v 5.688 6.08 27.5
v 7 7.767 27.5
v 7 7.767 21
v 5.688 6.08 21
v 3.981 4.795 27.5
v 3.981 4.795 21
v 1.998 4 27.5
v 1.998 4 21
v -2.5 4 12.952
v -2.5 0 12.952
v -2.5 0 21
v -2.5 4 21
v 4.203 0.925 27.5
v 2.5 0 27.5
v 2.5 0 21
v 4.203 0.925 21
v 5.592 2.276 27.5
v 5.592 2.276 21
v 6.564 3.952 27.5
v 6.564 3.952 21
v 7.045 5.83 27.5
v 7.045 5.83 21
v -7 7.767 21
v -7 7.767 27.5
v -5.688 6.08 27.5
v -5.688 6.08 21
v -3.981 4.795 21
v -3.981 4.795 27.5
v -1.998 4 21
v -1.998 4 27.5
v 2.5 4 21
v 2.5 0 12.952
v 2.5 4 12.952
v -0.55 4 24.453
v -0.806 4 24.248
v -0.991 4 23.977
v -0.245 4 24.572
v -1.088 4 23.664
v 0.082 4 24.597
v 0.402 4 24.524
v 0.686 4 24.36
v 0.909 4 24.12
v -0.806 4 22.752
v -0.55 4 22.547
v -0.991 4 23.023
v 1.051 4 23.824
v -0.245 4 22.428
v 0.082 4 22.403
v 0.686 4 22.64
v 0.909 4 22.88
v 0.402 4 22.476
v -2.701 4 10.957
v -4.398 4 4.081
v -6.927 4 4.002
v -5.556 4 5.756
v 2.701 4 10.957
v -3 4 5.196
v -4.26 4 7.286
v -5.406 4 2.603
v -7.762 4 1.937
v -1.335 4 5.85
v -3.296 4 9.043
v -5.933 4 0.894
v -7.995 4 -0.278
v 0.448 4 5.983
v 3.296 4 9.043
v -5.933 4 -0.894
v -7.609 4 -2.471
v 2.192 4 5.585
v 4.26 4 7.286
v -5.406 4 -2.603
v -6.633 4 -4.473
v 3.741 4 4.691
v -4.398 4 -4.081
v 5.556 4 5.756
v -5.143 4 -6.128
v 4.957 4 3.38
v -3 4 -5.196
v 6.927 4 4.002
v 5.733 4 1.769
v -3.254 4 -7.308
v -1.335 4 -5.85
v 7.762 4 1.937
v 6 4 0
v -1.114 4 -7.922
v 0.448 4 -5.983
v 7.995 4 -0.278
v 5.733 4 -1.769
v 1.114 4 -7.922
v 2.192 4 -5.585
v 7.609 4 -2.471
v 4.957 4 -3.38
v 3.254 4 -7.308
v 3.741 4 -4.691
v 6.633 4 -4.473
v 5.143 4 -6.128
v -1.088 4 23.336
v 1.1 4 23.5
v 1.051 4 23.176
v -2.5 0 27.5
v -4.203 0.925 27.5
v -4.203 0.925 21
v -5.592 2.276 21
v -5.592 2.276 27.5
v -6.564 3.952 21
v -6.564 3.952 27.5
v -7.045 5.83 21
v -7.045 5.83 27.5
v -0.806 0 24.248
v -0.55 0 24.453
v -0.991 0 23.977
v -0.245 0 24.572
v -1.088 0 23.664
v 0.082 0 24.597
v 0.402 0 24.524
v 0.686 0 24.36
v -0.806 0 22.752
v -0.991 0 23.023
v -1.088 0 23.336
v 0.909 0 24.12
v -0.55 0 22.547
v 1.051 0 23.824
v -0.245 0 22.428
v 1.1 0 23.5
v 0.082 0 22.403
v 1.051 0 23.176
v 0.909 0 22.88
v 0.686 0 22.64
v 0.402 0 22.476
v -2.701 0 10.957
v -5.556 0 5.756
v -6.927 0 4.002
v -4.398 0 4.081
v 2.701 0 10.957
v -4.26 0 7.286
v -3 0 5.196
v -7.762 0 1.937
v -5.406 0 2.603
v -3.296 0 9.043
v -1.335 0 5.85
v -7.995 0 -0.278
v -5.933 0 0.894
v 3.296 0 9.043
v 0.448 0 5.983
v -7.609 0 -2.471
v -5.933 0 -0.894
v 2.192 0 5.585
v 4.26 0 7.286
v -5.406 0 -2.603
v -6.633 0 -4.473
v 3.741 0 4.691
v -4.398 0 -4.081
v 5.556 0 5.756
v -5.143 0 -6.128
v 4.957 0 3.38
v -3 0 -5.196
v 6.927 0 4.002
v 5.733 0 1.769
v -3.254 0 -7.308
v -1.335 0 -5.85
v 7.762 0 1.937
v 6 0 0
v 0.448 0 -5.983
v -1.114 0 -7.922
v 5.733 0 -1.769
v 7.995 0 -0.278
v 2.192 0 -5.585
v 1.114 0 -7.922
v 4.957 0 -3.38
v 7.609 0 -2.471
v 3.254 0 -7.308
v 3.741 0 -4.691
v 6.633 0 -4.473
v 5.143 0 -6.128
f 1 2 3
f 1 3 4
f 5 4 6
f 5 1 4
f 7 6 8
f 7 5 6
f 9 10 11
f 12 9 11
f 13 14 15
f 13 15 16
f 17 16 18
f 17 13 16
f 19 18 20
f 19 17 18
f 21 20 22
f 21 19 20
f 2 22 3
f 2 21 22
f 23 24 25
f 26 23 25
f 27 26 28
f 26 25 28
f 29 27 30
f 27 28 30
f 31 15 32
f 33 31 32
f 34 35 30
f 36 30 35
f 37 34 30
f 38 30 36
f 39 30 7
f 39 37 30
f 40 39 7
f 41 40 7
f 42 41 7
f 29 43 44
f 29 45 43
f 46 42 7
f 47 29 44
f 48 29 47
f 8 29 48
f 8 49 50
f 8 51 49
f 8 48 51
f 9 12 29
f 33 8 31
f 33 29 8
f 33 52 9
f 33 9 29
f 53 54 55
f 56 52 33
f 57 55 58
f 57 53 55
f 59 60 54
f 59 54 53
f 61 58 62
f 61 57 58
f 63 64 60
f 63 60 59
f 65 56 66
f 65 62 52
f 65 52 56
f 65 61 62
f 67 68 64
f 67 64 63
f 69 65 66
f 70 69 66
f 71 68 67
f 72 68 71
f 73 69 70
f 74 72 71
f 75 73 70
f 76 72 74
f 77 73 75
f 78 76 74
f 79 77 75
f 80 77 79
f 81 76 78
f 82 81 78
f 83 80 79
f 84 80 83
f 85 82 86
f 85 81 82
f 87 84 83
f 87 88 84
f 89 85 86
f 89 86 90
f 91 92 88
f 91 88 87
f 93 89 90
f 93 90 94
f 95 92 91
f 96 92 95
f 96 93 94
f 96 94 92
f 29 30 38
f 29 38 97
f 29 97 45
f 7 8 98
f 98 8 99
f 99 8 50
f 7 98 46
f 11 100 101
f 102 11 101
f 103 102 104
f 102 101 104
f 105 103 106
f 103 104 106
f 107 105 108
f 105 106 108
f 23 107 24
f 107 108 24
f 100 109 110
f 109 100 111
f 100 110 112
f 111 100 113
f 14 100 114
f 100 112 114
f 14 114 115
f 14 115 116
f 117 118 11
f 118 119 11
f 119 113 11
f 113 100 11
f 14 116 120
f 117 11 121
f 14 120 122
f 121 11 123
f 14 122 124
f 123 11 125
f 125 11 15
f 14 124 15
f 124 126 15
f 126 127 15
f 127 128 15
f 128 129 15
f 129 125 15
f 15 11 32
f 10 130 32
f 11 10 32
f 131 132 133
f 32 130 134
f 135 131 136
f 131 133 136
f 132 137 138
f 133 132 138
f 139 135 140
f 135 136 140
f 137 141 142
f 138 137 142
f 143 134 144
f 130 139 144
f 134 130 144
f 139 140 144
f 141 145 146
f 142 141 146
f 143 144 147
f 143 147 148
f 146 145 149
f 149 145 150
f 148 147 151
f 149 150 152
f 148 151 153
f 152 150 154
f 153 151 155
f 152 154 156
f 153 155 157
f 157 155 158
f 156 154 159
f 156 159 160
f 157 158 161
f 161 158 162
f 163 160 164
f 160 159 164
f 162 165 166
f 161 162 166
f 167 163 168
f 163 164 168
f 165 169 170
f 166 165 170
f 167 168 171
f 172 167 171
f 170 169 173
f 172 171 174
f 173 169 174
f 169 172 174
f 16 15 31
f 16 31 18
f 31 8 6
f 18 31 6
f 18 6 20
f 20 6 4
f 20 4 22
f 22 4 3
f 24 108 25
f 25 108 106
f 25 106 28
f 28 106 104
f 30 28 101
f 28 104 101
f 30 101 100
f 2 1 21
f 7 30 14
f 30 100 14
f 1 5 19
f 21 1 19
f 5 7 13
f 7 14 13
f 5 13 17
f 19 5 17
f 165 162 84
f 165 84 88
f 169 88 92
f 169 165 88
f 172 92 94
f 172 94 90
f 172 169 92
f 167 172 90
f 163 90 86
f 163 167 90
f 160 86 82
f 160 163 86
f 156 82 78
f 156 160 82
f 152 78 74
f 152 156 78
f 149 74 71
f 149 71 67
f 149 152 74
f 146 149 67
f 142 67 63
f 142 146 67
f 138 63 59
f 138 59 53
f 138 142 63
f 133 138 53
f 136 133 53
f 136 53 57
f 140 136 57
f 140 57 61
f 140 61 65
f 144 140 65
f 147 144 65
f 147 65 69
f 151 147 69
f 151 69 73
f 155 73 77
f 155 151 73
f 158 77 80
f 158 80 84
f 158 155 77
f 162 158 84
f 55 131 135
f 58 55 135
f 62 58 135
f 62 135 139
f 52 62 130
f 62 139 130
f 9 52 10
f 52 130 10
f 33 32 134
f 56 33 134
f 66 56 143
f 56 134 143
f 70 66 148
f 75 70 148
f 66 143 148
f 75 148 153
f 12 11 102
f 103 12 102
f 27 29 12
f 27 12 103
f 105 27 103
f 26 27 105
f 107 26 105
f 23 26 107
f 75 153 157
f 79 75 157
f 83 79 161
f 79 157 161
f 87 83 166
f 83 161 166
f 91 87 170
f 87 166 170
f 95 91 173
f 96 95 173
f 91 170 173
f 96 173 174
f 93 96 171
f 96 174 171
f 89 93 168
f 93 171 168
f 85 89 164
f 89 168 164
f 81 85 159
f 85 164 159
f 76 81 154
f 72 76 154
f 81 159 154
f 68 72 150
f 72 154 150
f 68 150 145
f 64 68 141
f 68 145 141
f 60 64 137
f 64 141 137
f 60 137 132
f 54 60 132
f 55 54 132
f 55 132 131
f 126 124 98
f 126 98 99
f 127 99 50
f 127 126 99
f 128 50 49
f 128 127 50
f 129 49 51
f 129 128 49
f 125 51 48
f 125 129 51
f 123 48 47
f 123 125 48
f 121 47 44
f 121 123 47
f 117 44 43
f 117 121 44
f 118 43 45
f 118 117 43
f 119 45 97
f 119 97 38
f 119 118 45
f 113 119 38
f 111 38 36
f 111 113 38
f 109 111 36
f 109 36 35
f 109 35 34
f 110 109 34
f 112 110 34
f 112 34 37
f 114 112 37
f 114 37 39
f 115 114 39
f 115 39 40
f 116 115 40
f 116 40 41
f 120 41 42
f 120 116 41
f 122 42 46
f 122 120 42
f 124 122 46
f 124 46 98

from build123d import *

# Parameters (mm, degrees)
SKETCH1_R           = 6
SKETCH1_R_2         = 1.1
BOSS_EXTRUDE1_DEPTH = 4
BOSS_EXTRUDE2_DEPTH = 6.5


with BuildPart() as part:
    # Sketch1 → Boss-Extrude1 (new body)
    with BuildSketch(Plane(origin=(0, 0, 0), x_dir=(1, 0, 0), z_dir=(0, 1, 0))):
        with BuildLine():
            Line((-2.5, -27.5), (2.5, -27.5))
            Line((2.5, -27.5), (2.5, -12.951833847))
            ThreePointArc((2.5, -12.951833847), (3.295532486, -9.043154047), (5.555555556, -5.756370599))
            ThreePointArc((5.555555556, -5.756370599), (0, 8), (-5.555555556, -5.756370599))
            ThreePointArc((-5.555555556, -5.756370599), (-3.295532486, -9.043154047), (-2.5, -12.951833847))
            Line((-2.5, -12.951833847), (-2.5, -27.5))
        make_face()
        Circle(SKETCH1_R, mode=Mode.SUBTRACT)
        with Locations((0, -23.5)):
            Circle(SKETCH1_R_2, mode=Mode.SUBTRACT)
    extrude(amount=BOSS_EXTRUDE1_DEPTH)

    # Sketch2 → Boss-Extrude2 (add)
    with BuildSketch(Plane.XY.offset(27.5)):
        with BuildLine():
            Line((-1.997835367, 4), (-2.5, 0))
            ThreePointArc((-2.5, 0), (-6.135441291, 3.080743774), (-7, 7.766888651))
            ThreePointArc((-7, 7.766888651), (-4.877255668, 5.381037947), (-1.997835367, 4))
        make_face()
    boss_extrude2 = extrude(amount=-BOSS_EXTRUDE2_DEPTH)

    # Mirror1: Boss-Extrude2 across plane
    add(boss_extrude2.mirror(Plane(origin=(0, 0, 0), x_dir=(0, 0, 1), z_dir=(1, 0, 0))))


solid = part.part
